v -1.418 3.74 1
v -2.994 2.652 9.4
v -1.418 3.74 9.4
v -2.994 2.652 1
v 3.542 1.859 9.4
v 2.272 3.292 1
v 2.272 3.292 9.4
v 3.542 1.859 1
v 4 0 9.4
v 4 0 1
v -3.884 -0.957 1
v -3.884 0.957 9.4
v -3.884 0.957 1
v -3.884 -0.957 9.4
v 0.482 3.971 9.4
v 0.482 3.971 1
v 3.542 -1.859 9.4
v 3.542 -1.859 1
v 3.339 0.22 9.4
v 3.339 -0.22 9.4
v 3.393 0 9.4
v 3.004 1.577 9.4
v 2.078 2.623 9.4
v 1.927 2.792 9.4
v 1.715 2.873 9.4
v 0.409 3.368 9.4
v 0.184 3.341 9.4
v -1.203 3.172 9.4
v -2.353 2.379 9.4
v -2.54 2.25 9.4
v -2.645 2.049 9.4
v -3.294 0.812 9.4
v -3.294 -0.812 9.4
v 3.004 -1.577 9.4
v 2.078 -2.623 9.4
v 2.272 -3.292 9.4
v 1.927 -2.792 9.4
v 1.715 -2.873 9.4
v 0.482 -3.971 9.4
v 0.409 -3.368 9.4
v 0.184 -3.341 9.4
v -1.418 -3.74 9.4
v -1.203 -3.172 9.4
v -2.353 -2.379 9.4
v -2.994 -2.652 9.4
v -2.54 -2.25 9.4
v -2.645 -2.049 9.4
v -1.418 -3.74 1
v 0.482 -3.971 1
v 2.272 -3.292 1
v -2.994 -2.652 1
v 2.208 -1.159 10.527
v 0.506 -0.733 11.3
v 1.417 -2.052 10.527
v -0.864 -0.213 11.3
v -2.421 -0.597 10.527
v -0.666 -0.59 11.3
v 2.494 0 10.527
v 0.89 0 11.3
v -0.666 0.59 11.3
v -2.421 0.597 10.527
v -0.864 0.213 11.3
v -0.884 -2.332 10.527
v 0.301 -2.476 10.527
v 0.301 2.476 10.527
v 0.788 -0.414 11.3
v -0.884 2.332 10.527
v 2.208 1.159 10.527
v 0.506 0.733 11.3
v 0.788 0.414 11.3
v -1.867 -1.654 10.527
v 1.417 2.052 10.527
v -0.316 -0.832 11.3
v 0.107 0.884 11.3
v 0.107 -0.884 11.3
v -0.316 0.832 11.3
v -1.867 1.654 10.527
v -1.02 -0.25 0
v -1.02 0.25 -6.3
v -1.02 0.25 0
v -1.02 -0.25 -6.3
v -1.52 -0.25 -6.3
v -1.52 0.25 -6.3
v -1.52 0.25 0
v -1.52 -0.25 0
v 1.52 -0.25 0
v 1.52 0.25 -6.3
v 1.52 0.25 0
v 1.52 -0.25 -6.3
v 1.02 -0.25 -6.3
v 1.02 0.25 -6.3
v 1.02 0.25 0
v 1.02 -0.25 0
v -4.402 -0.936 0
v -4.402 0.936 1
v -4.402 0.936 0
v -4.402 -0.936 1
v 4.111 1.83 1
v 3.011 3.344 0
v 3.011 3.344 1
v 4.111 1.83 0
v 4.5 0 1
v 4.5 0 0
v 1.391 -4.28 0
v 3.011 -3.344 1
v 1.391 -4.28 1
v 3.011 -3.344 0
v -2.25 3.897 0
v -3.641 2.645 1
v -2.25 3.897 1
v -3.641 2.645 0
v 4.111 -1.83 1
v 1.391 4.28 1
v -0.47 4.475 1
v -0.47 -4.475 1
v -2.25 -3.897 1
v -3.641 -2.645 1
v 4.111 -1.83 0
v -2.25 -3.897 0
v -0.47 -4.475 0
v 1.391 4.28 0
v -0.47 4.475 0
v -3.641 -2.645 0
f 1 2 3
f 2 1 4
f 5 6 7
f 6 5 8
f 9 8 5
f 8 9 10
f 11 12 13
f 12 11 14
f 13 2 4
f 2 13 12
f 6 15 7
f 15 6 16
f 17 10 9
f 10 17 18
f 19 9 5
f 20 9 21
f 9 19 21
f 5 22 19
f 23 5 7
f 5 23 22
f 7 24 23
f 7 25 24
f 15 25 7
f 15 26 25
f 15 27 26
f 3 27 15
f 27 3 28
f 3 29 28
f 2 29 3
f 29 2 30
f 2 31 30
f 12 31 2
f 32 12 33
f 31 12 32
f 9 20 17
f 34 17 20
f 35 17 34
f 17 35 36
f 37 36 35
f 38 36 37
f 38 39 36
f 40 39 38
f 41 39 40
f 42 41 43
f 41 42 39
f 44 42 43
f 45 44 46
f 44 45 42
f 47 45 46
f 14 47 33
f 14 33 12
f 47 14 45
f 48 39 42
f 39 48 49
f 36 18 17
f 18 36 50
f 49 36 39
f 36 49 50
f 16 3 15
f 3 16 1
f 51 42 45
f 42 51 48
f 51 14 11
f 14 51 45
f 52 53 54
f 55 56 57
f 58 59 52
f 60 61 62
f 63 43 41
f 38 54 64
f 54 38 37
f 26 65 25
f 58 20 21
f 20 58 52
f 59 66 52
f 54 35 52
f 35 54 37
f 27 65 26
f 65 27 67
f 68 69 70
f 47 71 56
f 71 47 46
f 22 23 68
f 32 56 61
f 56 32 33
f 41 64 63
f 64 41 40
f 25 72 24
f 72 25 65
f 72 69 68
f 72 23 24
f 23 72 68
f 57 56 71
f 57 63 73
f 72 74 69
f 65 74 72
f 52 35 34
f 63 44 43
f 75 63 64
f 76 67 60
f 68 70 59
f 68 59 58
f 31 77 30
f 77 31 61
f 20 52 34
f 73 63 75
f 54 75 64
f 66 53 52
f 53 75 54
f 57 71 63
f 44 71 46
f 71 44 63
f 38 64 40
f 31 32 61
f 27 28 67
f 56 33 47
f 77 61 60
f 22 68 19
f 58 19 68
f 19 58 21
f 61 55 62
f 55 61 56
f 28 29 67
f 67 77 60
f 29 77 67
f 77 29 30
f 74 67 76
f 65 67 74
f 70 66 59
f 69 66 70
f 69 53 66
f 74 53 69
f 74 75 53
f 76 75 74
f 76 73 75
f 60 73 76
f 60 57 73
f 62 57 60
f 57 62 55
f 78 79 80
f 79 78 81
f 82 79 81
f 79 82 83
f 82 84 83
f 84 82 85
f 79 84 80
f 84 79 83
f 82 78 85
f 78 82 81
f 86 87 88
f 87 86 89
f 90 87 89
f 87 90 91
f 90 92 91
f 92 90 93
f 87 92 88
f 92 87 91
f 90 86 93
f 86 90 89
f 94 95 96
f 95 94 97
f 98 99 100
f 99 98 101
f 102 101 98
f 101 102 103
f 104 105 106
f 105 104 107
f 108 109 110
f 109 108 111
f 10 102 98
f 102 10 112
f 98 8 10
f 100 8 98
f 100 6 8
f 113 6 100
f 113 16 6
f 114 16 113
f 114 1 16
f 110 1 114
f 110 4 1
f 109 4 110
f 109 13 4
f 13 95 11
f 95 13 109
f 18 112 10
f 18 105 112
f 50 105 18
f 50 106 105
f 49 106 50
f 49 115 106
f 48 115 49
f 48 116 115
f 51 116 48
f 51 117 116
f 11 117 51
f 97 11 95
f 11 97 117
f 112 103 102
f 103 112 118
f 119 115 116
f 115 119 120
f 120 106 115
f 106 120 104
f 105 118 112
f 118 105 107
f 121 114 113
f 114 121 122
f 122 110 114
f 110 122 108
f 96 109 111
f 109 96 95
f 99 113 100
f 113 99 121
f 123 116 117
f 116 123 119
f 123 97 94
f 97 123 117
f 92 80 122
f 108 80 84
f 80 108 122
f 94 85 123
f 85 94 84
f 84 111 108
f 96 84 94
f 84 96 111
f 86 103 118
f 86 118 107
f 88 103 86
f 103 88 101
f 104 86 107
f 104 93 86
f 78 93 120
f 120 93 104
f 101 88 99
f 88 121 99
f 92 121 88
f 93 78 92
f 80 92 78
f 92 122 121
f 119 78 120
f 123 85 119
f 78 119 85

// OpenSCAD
// Parameters
led_diameter_mm = 8; //[4:16:0.1]
body_height_mm = 9.2; //[4.6:18.4:0.1]
rim_thickness_mm = 1; //[0.5:2:0.1]
rim_diameter_mm = 9; //[6:18:0.1]
lead_pitch_mm = 2.54; //[1.27:5.08:0.01]
lead_thickness_mm = 0.5; //[0.3:1:0.01]
lead_length_mm = 5; //[2.5:15:0.1]
eps_mm = 0.8; //[0.5:2:0.1]
lens_tip_radius_mm = 4; //[2:8:0.1]
lens_tip_overlap_mm = 1.2; //[0.5:3:0.1]
grill_hole_mm = 1.2; //[0.6:3:0.1]
grill_r_mm = 1000; //[50:2000:10]

// LED Module
module led() {
  color("red") {
    // LED Body
    union() {
      translate([0, 0, rim_thickness_mm + body_height_mm/2 - eps_mm])
        cylinder(r=led_diameter_mm/2, h=body_height_mm, center=true);
      translate([0, 0, rim_thickness_mm + body_height_mm - lens_tip_radius_mm + lens_tip_overlap_mm])
        sphere(r=lens_tip_radius_mm, center=true);
    }
    // Base Rim Flange
    translate([0, 0, rim_thickness_mm/2])
      cylinder(r=rim_diameter_mm/2, h=rim_thickness_mm, center=true);
    // Leads
    union() {
      translate([-lead_pitch_mm/2, 0, -(lead_length_mm + rim_thickness_mm + eps_mm)/2 + rim_thickness_mm/2])
        cube([lead_thickness_mm, lead_thickness_mm, lead_length_mm + rim_thickness_mm + eps_mm], center=true);
      translate([lead_pitch_mm/2, 0, -(lead_length_mm + rim_thickness_mm + eps_mm)/2 + rim_thickness_mm/2])
        cube([lead_thickness_mm, lead_thickness_mm, lead_length_mm + rim_thickness_mm + eps_mm], center=true);
    }
  }
}

// Grill Hole Positions Module
module grill_hole_positions() {
  color("Silver") {
    for (i = [-1, 0, 1])
      for (j = [-1, 0, 1])
        if (i != 0 || j != 0) {
          translate([i * grill_hole_mm * 2, j * grill_hole_mm * 2, rim_thickness_mm/2])
            cylinder(r=grill_hole_mm/2, h=rim_thickness_mm, center=true);
        }
  }
}

// Assembly Module
module assembly() {
  led();
  grill_hole_positions();
}

assembly();
